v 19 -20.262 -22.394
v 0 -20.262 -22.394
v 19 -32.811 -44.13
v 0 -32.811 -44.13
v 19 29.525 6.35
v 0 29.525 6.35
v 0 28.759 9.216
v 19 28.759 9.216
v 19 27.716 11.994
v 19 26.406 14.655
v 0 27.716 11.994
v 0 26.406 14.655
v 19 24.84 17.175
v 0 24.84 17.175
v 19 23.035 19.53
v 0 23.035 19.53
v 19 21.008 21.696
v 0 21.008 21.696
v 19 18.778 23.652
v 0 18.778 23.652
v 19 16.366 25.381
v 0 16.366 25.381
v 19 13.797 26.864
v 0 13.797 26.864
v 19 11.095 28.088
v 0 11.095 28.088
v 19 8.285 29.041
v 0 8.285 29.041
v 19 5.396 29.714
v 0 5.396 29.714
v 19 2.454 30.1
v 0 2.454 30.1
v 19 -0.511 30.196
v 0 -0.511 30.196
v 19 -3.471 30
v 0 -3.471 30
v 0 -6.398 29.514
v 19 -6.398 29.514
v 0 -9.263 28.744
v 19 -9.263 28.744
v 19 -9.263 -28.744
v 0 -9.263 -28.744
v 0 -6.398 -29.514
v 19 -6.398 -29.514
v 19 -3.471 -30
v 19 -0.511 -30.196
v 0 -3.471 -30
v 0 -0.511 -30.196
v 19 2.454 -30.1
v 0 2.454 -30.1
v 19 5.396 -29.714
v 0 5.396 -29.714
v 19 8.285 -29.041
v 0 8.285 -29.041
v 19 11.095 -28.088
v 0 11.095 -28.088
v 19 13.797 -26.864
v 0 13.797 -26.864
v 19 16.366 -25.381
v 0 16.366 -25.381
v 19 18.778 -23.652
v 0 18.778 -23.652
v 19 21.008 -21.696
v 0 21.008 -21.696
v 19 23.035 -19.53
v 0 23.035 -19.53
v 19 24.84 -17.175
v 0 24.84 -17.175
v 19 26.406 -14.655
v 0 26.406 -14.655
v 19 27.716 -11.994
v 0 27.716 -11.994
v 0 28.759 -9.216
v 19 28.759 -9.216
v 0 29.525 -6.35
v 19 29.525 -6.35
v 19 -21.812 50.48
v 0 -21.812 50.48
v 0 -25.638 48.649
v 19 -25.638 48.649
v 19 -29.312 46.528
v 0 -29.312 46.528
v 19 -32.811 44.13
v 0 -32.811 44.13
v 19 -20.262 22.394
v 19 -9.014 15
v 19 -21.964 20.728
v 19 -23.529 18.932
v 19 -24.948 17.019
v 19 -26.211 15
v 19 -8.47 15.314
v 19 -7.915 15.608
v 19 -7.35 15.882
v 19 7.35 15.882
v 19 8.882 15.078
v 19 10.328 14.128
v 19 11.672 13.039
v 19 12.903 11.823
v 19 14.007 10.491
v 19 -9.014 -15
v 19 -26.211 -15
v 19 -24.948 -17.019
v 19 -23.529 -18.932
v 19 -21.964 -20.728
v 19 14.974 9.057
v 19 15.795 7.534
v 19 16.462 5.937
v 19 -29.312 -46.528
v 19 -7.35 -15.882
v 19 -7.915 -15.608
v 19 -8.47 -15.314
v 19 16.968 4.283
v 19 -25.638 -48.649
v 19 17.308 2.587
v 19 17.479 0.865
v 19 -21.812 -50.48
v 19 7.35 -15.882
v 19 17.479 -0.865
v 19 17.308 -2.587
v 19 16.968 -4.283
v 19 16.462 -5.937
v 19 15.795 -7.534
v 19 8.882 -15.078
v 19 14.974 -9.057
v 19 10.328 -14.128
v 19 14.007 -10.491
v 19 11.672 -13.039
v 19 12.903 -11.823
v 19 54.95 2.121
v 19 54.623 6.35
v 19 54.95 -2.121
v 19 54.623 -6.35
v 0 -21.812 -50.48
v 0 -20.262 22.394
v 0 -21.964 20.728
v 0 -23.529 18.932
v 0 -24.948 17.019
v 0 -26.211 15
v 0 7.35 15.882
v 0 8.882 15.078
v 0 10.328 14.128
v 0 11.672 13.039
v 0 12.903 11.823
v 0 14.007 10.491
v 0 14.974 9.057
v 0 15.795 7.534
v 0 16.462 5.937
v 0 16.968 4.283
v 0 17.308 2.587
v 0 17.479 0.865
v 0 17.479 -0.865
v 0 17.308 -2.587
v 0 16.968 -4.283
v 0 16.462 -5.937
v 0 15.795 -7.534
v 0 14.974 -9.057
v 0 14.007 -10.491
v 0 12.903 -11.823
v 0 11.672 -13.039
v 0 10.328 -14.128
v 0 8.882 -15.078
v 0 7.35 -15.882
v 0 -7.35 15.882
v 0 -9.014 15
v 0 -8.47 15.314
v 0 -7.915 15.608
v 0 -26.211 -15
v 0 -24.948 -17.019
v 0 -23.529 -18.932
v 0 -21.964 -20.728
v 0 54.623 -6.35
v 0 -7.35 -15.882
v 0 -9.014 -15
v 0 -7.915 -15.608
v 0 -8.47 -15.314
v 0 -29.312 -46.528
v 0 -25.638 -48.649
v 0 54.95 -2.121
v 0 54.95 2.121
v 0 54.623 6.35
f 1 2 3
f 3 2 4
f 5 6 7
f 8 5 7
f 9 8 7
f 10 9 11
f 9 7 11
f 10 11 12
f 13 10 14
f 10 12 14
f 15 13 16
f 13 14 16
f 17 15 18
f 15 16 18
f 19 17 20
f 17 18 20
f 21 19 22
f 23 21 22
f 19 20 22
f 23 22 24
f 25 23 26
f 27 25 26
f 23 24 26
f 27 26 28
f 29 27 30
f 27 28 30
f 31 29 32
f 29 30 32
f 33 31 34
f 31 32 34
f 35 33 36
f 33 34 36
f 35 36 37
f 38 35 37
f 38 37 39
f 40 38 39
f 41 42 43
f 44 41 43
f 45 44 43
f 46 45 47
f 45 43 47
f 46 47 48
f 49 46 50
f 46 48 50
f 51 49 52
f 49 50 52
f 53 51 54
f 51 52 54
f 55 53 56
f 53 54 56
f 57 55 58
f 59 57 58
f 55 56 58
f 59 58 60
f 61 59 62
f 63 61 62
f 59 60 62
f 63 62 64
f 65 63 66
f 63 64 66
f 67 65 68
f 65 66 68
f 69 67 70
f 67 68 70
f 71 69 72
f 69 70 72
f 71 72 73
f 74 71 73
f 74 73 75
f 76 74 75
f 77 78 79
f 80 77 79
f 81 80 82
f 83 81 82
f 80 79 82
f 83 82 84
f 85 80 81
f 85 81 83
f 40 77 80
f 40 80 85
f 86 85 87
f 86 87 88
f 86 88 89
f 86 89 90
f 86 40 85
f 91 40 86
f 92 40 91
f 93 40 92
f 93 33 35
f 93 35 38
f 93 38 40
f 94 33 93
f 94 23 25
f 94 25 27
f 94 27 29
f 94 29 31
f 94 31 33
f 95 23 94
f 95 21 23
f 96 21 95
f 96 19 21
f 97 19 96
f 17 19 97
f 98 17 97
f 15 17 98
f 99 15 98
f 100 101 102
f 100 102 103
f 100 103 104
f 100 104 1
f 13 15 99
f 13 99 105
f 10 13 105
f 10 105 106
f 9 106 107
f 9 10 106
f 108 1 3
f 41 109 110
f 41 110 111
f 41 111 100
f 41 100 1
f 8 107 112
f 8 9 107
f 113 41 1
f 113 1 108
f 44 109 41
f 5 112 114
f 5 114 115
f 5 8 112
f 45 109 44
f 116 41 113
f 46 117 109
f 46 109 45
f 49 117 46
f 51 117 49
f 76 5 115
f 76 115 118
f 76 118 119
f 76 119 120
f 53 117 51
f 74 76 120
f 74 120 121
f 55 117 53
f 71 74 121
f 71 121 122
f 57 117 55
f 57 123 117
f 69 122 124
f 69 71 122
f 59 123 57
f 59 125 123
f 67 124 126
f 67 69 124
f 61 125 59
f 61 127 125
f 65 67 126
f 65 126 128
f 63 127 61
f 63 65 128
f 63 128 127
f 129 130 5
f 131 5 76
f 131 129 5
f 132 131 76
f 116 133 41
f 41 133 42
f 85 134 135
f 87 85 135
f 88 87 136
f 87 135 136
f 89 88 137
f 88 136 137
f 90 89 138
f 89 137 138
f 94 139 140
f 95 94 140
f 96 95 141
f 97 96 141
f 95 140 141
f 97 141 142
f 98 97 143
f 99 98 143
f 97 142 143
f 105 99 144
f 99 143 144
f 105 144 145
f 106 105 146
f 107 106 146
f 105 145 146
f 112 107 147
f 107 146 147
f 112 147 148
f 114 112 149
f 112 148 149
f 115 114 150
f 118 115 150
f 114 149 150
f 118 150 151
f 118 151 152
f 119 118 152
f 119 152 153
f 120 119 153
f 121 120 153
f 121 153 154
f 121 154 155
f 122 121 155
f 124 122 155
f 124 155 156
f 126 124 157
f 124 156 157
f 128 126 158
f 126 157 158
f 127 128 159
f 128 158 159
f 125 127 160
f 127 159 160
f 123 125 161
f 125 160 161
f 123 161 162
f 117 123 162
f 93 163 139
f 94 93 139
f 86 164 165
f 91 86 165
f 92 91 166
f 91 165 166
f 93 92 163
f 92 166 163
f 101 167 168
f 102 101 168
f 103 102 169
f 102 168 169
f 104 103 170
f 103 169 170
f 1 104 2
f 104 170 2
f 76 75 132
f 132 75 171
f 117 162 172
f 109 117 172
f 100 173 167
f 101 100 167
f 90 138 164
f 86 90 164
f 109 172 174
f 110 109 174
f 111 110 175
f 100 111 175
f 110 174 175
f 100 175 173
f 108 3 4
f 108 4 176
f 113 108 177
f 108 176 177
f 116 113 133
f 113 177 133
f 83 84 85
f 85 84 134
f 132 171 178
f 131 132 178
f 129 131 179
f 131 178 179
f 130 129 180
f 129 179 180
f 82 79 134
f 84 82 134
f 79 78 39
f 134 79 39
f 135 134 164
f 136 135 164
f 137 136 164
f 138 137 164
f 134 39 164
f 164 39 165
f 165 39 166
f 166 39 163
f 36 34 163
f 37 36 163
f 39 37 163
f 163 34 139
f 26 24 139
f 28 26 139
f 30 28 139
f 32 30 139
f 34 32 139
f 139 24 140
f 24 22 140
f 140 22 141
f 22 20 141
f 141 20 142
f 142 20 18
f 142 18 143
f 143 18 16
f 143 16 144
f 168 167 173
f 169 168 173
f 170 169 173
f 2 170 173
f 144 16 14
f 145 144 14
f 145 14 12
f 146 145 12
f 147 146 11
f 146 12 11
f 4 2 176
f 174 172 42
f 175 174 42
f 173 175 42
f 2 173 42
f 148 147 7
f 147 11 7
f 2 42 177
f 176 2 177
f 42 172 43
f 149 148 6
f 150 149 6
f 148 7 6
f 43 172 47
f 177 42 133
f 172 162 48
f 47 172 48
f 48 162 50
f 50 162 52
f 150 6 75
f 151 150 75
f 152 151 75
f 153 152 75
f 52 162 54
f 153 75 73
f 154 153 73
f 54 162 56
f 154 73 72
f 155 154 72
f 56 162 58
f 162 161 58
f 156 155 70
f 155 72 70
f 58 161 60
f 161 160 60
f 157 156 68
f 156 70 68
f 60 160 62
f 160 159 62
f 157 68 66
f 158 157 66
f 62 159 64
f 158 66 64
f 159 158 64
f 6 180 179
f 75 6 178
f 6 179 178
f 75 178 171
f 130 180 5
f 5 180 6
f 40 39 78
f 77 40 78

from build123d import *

# Parameters (mm, degrees)
BOSS_EXTRUDE1_DEPTH = 19


with BuildPart() as part:
    # Sketch1 → Boss-Extrude1 (new body)
    with BuildSketch(Plane(origin=(0, 0, 0), x_dir=(0, 0, -1), z_dir=(1, 0, 0))):
        with BuildLine():
            Line((15.881671826, 7.35), (15.881671826, -7.35))
            ThreePointArc((15.881671826, -7.35), (15.463231756, -8.19380642), (15, -9.013878189))
            Line((15, -9.013878189), (15, -26.211447881))
            ThreePointArc((15, -26.211447881), (18.932325741, -23.528855519), (22.394280885, -20.261692516))
            Line((22.394280885, -20.261692516), (44.130028123, -32.810832035))
            ThreePointArc((44.130028123, -32.810832035), (47.62360298, -27.4955), (50.480028123, -21.812309407))
            Line((50.480028123, -21.812309407), (28.744280885, -9.263169888))
            ThreePointArc((28.744280885, -9.263169888), (26.153967194, 15.1), (6.35, 29.524862404))
            Line((6.35, 29.524862404), (6.35, 54.623141442))
            ThreePointArc((6.35, 54.623141442), (0, 54.991), (-6.35, 54.623141442))
            Line((-6.35, 54.623141442), (-6.35, 29.524862404))
            ThreePointArc((-6.35, 29.524862404), (-26.153967194, 15.1), (-28.744280885, -9.263169888))
            Line((-28.744280885, -9.263169888), (-50.480028123, -21.812309407))
            ThreePointArc((-50.480028123, -21.812309407), (-47.62360298, -27.4955), (-44.130028123, -32.810832035))
            Line((-44.130028123, -32.810832035), (-22.394280885, -20.261692516))
            ThreePointArc((-22.394280885, -20.261692516), (-18.932325741, -23.528855519), (-15, -26.211447881))
            Line((-15, -26.211447881), (-15, -9.013878189))
            ThreePointArc((-15, -9.013878189), (-15.463231756, -8.19380642), (-15.881671826, -7.35))
            Line((-15.881671826, -7.35), (-15.881671826, 7.35))
            ThreePointArc((-15.881671826, 7.35), (0, 17.5), (15.881671826, 7.35))
        make_face()
    extrude(amount=BOSS_EXTRUDE1_DEPTH)


solid = part.part
